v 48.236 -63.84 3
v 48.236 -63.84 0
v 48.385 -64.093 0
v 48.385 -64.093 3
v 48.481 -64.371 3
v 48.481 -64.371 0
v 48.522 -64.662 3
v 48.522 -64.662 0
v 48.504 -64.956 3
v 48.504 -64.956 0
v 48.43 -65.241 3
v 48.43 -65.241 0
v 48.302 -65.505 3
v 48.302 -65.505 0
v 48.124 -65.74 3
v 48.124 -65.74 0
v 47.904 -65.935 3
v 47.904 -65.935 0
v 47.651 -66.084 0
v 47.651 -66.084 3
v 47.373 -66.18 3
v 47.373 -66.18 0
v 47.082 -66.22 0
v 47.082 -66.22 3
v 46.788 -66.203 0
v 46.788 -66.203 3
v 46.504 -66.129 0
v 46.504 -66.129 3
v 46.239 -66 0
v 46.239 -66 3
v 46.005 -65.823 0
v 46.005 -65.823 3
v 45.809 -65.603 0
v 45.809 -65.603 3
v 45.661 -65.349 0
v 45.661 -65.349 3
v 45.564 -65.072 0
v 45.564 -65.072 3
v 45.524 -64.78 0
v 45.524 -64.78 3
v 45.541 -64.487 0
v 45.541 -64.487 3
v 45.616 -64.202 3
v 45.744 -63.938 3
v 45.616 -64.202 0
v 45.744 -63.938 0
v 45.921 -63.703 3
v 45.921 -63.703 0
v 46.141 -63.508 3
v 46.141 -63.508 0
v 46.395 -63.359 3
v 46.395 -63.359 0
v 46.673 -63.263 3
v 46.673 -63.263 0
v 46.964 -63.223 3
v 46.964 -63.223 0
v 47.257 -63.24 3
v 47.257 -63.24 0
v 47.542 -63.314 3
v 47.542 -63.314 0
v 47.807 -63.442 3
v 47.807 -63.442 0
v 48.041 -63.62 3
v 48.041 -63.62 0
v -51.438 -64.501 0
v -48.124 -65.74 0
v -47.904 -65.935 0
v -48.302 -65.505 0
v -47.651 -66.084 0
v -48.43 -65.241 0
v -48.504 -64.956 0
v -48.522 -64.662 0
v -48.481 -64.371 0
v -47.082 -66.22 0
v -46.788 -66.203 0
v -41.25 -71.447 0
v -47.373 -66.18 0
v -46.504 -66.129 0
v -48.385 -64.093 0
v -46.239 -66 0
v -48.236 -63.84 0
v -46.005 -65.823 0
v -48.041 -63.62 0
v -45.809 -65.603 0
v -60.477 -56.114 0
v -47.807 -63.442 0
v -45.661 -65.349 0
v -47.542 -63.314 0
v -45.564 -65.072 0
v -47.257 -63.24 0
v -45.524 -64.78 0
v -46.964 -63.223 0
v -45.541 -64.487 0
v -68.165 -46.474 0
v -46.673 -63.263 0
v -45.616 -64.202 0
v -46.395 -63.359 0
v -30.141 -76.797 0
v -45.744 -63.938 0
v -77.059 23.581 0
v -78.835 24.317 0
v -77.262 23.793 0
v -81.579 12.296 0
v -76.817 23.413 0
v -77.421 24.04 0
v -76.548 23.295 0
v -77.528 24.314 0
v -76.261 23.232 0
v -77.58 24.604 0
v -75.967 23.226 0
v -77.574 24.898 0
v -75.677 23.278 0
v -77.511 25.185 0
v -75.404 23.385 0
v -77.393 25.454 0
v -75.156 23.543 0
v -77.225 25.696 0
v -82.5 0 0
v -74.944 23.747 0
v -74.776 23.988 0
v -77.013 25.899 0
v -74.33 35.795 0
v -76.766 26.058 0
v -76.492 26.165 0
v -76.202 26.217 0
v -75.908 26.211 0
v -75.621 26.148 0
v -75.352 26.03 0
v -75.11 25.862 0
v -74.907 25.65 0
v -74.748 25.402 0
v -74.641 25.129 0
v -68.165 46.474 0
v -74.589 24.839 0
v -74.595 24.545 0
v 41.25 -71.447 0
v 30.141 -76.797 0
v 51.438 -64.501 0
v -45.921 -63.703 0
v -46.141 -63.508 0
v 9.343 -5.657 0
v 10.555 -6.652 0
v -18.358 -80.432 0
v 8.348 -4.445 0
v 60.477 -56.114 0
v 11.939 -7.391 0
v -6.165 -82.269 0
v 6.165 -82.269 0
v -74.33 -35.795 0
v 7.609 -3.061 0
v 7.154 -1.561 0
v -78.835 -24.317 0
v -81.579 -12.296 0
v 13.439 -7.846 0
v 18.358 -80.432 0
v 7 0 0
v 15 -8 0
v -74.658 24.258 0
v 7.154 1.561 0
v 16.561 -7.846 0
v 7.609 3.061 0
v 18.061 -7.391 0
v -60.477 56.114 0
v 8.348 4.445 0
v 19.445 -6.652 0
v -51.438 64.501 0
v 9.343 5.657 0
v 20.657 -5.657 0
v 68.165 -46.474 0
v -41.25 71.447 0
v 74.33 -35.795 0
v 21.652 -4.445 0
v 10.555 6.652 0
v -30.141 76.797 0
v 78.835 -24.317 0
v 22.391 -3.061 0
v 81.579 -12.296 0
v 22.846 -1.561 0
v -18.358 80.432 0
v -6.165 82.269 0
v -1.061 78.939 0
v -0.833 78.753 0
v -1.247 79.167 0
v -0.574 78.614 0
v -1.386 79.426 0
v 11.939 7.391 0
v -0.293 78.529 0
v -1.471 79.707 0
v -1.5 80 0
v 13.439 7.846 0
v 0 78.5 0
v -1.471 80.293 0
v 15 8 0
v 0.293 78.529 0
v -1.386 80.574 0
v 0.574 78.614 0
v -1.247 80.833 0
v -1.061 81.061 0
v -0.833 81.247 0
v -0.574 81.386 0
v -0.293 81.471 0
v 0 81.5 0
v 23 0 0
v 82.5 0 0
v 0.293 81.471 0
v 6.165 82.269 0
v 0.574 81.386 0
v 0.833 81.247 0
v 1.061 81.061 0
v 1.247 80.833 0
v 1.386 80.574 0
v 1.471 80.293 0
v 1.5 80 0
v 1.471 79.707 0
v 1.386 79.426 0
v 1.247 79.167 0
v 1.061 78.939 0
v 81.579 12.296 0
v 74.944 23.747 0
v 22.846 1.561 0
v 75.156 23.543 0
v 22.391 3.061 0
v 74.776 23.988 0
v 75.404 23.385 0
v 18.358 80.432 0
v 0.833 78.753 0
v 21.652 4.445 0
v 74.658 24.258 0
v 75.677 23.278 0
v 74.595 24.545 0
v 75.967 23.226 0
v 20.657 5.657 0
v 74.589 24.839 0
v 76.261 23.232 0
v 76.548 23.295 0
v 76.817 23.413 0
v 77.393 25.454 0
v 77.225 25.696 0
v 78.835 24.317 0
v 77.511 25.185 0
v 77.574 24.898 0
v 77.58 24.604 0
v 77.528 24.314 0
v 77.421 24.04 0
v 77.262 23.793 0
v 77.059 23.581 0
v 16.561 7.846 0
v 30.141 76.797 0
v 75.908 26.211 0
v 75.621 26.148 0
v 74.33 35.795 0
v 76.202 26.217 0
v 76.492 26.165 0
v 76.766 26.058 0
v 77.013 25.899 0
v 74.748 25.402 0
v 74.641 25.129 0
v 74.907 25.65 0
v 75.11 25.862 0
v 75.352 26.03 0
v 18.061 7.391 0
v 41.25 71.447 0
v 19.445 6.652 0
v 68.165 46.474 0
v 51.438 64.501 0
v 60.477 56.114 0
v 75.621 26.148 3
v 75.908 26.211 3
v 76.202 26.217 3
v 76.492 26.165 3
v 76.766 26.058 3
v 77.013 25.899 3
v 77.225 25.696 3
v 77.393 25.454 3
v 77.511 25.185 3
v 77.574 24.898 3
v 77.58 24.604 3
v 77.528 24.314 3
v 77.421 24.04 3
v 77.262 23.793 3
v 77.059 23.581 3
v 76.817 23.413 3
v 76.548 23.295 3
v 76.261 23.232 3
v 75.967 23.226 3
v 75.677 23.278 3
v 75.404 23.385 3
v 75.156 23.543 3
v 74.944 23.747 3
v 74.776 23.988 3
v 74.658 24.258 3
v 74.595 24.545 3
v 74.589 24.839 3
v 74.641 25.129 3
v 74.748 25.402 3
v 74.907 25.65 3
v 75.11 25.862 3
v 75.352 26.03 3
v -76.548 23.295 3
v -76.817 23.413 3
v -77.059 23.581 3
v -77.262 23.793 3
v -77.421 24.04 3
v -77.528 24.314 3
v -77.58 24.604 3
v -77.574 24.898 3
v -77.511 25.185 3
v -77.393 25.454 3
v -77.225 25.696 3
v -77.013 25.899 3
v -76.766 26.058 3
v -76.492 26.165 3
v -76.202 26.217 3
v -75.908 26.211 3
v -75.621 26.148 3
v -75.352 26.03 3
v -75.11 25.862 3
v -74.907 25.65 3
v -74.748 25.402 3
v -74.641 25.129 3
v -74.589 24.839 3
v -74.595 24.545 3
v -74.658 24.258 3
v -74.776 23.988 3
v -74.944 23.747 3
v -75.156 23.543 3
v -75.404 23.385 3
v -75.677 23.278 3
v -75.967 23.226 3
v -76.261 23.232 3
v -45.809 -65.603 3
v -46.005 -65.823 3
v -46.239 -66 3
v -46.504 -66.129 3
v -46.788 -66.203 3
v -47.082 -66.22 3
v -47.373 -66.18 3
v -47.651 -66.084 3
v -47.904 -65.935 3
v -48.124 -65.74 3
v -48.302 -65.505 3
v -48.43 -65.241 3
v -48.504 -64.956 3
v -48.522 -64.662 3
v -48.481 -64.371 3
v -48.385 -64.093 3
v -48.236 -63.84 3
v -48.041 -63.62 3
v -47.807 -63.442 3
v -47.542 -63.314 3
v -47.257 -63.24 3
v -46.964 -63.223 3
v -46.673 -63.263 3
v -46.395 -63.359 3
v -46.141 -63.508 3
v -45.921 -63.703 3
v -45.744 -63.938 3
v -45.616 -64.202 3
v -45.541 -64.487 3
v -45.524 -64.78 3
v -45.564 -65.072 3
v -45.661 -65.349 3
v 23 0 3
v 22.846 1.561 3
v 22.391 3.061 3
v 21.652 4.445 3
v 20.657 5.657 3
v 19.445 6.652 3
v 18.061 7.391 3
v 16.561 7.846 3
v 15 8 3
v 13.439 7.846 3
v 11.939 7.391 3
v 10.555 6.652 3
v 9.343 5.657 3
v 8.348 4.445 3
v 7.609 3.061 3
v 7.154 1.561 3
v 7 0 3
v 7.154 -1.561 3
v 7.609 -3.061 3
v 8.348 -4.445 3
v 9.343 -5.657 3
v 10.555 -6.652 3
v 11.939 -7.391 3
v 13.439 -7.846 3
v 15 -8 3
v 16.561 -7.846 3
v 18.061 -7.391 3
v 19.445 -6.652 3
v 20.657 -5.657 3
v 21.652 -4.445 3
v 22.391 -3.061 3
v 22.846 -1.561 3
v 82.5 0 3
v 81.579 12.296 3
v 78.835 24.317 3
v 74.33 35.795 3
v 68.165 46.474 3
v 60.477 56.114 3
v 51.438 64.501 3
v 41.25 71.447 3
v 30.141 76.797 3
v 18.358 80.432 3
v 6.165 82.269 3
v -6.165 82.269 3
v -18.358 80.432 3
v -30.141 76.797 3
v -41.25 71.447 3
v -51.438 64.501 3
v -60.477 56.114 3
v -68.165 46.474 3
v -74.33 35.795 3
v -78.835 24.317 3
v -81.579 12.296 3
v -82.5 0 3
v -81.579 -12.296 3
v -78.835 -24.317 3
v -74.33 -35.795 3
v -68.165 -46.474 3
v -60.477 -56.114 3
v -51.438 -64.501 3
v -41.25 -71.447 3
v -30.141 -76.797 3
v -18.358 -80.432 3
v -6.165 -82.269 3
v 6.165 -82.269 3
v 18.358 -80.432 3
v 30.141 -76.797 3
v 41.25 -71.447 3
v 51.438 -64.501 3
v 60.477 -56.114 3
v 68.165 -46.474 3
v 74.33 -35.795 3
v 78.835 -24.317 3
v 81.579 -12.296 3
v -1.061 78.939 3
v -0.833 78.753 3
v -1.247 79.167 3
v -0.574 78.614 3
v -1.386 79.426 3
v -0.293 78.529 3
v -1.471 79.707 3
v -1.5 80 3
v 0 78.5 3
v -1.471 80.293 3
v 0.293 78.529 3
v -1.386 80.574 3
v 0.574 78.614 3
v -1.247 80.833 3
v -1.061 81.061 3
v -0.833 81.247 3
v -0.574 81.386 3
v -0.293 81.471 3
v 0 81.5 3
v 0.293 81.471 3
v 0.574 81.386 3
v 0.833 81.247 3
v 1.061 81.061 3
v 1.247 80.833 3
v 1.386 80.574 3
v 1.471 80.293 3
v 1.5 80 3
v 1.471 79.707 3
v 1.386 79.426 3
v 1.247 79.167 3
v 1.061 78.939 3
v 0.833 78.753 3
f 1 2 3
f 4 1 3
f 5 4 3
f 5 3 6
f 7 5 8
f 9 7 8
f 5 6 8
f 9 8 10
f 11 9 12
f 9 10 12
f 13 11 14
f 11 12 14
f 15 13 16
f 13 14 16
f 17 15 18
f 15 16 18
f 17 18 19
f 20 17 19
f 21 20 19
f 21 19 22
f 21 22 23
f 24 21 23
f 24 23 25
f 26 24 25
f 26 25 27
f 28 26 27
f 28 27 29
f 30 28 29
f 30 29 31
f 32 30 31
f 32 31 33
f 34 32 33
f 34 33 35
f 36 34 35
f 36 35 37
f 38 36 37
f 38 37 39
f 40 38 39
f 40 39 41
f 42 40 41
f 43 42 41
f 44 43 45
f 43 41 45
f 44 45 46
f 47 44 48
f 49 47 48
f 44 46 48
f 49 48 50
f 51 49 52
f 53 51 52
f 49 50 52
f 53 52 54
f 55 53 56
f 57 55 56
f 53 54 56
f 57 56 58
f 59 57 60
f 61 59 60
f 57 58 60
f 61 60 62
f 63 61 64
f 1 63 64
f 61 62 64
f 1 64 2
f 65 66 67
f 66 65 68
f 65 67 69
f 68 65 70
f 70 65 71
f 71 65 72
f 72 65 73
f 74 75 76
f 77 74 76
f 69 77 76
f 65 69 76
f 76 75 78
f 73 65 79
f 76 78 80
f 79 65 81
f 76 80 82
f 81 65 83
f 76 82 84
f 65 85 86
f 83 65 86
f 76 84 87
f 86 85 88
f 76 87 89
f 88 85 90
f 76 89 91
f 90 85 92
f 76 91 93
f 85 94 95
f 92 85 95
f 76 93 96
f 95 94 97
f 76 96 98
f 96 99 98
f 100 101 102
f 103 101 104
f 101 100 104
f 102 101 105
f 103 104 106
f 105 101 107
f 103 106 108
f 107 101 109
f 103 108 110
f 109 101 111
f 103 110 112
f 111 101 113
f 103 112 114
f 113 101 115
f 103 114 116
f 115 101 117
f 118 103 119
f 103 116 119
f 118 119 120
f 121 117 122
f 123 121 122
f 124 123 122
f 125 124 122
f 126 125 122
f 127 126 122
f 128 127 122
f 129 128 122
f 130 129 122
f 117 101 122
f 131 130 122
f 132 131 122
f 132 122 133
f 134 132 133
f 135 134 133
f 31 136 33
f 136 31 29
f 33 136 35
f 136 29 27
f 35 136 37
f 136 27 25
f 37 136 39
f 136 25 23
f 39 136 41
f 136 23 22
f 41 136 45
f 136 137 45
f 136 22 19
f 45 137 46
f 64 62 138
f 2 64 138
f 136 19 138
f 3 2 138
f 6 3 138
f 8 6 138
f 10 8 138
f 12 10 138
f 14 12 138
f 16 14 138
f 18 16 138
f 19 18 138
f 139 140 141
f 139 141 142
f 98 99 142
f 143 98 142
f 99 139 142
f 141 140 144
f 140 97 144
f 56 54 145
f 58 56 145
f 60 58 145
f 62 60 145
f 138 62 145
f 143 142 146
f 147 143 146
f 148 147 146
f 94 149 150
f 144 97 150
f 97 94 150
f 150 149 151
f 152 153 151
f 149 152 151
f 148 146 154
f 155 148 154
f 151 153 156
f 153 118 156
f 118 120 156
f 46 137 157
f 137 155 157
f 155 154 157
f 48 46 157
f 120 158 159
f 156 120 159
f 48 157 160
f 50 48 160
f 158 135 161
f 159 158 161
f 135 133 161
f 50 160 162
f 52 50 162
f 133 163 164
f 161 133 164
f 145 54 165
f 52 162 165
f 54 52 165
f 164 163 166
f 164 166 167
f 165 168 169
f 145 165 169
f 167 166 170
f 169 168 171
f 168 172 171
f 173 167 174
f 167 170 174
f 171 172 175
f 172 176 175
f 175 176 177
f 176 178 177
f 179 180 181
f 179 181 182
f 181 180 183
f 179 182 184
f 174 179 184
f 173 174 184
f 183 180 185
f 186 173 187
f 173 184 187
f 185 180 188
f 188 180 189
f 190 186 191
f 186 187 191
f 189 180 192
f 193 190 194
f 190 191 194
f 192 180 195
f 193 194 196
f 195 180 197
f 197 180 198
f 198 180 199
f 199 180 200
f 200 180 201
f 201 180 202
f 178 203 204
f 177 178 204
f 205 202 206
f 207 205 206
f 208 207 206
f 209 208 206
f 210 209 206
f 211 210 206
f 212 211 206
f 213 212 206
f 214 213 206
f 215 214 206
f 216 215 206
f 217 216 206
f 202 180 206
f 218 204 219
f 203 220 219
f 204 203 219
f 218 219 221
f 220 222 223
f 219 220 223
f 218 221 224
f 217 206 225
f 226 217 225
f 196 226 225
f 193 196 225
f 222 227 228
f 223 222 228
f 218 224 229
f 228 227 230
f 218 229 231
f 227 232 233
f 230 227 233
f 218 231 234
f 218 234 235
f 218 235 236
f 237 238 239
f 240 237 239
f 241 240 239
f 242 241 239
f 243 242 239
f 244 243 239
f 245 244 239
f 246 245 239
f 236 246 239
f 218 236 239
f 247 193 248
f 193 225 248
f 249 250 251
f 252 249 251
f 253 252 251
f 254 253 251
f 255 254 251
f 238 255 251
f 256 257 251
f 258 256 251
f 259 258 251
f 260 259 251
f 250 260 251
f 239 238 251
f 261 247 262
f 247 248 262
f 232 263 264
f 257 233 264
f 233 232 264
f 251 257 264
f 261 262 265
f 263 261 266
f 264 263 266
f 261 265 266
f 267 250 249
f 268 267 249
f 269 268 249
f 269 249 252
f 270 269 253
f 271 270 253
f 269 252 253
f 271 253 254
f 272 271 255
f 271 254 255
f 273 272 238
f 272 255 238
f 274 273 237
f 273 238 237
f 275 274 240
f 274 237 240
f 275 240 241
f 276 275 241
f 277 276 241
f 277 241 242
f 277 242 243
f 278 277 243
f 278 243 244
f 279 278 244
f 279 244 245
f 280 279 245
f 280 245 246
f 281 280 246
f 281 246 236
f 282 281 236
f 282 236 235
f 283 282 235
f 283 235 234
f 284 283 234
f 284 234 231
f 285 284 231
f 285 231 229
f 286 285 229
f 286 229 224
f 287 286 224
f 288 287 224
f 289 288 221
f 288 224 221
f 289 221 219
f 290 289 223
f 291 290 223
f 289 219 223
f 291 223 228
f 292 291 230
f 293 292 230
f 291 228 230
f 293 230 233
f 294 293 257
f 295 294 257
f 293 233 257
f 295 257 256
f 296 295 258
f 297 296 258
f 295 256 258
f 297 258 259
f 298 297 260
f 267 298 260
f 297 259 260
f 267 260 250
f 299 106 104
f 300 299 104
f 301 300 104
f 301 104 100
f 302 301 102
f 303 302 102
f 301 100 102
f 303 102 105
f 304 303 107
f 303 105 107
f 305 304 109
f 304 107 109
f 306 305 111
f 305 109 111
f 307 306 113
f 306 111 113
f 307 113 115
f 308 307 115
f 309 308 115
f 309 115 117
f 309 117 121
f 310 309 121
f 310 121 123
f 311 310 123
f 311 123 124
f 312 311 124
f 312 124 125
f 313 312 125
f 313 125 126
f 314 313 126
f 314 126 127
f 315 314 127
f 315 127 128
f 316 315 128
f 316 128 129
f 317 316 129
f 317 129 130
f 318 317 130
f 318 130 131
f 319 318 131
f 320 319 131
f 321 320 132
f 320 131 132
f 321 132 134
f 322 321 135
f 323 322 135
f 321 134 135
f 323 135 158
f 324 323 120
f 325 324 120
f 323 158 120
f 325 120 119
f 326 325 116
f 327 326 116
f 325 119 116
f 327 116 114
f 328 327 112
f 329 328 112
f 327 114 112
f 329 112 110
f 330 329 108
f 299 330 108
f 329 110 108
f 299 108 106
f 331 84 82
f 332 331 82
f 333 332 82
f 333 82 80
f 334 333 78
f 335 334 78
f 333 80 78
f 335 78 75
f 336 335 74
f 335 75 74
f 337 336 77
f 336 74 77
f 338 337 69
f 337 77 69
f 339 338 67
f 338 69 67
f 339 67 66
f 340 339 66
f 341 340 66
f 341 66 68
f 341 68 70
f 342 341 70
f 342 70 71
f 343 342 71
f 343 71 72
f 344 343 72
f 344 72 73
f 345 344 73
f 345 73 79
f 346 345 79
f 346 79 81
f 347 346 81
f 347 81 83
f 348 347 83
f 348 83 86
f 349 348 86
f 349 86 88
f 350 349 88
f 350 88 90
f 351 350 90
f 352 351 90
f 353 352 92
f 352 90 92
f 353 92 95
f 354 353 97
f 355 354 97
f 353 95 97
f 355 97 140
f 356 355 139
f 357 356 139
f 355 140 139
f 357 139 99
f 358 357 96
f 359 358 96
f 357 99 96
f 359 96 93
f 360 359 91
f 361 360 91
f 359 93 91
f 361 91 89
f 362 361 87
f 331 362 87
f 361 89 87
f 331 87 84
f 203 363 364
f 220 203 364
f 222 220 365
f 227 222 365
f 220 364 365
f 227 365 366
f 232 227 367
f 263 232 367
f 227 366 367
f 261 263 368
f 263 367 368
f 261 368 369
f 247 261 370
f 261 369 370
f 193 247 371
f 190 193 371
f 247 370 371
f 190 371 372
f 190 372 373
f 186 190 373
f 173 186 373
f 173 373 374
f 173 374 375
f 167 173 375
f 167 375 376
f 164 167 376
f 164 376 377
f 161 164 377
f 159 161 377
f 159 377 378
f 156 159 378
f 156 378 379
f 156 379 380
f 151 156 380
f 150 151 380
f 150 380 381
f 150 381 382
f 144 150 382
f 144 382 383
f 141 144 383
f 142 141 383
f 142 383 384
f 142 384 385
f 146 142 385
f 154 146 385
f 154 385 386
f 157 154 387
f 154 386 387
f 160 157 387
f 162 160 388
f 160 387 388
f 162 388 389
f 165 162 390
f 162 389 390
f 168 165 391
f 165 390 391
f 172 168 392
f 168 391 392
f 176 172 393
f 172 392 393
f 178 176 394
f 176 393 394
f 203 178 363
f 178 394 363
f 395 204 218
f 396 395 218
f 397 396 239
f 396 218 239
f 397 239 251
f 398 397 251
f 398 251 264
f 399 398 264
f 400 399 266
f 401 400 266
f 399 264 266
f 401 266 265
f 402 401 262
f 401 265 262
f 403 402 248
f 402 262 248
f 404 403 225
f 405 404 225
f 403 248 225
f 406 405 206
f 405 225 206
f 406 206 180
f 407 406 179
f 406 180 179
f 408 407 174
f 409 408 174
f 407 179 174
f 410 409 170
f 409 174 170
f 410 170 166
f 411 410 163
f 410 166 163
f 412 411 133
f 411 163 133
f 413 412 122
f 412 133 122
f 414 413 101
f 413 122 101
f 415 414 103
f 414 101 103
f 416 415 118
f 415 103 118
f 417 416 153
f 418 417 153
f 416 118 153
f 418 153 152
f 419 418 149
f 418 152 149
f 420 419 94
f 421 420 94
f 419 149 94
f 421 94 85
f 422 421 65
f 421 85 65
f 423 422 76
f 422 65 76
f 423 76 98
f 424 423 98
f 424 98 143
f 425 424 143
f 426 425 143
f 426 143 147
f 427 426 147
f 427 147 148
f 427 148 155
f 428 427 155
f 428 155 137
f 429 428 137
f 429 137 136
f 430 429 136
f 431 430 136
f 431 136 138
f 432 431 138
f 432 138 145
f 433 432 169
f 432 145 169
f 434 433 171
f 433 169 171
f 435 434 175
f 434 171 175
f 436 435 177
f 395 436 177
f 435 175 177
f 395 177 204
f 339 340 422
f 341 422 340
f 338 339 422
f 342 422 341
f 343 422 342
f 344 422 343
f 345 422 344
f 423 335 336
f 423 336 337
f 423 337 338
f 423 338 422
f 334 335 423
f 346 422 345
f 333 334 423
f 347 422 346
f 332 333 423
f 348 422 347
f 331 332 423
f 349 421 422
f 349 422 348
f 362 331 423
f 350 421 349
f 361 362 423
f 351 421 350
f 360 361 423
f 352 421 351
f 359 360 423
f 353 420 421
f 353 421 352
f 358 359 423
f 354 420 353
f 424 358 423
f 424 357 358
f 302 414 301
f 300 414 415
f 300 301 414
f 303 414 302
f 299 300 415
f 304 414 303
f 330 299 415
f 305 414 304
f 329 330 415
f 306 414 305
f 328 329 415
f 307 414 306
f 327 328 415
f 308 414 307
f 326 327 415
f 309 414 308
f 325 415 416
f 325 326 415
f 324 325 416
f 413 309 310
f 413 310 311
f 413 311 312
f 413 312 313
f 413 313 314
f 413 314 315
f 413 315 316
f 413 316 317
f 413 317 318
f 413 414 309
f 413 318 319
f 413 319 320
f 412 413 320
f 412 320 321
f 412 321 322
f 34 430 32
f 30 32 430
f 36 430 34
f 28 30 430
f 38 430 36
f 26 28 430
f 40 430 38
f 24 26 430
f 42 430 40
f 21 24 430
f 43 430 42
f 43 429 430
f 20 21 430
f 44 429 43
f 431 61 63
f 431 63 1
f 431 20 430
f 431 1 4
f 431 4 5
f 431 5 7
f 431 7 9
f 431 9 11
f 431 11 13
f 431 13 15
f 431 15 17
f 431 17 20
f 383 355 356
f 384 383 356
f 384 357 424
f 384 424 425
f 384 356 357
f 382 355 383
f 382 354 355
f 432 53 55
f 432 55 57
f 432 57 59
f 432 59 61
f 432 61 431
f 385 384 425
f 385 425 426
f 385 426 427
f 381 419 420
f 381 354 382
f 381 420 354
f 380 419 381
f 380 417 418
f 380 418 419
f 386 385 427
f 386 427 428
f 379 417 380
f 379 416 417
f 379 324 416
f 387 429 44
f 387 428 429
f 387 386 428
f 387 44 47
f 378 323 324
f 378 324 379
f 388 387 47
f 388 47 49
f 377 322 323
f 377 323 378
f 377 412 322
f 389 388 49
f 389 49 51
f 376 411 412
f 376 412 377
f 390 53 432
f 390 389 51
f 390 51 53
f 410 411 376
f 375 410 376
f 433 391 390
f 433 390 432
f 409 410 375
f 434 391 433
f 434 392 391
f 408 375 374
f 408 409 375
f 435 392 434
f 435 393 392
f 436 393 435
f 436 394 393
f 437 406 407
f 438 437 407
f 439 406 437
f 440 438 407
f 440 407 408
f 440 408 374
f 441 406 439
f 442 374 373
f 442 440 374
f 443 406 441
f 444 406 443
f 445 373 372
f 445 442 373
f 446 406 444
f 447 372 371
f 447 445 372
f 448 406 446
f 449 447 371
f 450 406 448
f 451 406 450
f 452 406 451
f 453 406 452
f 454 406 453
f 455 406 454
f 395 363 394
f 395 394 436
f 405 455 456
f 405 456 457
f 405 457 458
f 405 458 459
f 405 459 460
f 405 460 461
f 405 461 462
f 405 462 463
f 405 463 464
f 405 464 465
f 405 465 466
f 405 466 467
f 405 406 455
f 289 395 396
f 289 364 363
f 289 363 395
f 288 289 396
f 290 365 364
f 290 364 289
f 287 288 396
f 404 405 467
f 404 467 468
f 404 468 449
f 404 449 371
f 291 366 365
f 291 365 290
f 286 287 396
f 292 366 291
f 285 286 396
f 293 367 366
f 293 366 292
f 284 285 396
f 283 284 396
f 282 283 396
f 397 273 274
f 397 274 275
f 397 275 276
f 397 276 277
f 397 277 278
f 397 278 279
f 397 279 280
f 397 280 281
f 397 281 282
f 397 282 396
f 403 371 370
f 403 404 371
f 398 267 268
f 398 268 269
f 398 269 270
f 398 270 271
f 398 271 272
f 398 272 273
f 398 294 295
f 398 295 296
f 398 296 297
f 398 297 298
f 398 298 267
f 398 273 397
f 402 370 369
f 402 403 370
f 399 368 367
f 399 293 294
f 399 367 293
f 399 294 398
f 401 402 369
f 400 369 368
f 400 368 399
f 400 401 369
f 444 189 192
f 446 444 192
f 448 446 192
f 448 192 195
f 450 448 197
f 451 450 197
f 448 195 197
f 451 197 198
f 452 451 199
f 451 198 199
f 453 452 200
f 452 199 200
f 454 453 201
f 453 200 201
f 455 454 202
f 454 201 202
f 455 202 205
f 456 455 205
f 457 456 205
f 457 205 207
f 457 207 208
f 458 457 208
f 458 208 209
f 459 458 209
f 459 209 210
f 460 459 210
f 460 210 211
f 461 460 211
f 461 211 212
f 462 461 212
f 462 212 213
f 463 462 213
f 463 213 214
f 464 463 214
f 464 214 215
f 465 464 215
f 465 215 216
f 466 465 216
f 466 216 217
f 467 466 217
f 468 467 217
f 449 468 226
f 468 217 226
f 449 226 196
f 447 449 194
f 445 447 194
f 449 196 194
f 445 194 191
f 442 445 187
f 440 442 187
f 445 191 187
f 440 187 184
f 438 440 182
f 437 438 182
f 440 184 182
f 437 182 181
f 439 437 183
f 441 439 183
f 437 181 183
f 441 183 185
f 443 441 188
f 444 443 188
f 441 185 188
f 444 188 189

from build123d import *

# Parameters (mm, degrees)
SKETCH1_R             = 82.5
BOSS_EXTRUDE1_DEPTH   = 3
F_3_0MM_DOWEL_HOLE1_D = 3
CIRPATTERN1_COUNT     = 5
SKETCH4_R             = 8
CUT_EXTRUDE1_DEPTH    = 117.711181984


with BuildPart() as part:
    # Sketch1 → Boss-Extrude1 (new body)
    with BuildSketch(Plane.XY):
        Circle(SKETCH1_R)
    extrude(amount=BOSS_EXTRUDE1_DEPTH)

    # Ø3.0mm Dowel Hole1 (through all)
    with Locations(Plane(origin=(0, 80, 3), x_dir=(1, 0, 0), z_dir=(0, 0, 1))):
        with Locations((0, 0)):
            f_3_0mm_dowel_hole1 = Hole(F_3_0MM_DOWEL_HOLE1_D / 2)

    # CirPattern1: Ø3.0mm Dowel Hole1 ×5 about axis
    cirpattern1_axis = Axis((0, 0, 0), (0, 0, 1))
    for i in range(1, CIRPATTERN1_COUNT):
        add(f_3_0mm_dowel_hole1.rotate(cirpattern1_axis, i * 360 / CIRPATTERN1_COUNT), mode=Mode.SUBTRACT)

    # Sketch4 → Cut-Extrude1 (cut, through all)
    with BuildSketch(Plane.XY.offset(3)):
        with Locations((15, 0)):
            Circle(SKETCH4_R)
    extrude(amount=-CUT_EXTRUDE1_DEPTH, mode=Mode.SUBTRACT)


solid = part.part
